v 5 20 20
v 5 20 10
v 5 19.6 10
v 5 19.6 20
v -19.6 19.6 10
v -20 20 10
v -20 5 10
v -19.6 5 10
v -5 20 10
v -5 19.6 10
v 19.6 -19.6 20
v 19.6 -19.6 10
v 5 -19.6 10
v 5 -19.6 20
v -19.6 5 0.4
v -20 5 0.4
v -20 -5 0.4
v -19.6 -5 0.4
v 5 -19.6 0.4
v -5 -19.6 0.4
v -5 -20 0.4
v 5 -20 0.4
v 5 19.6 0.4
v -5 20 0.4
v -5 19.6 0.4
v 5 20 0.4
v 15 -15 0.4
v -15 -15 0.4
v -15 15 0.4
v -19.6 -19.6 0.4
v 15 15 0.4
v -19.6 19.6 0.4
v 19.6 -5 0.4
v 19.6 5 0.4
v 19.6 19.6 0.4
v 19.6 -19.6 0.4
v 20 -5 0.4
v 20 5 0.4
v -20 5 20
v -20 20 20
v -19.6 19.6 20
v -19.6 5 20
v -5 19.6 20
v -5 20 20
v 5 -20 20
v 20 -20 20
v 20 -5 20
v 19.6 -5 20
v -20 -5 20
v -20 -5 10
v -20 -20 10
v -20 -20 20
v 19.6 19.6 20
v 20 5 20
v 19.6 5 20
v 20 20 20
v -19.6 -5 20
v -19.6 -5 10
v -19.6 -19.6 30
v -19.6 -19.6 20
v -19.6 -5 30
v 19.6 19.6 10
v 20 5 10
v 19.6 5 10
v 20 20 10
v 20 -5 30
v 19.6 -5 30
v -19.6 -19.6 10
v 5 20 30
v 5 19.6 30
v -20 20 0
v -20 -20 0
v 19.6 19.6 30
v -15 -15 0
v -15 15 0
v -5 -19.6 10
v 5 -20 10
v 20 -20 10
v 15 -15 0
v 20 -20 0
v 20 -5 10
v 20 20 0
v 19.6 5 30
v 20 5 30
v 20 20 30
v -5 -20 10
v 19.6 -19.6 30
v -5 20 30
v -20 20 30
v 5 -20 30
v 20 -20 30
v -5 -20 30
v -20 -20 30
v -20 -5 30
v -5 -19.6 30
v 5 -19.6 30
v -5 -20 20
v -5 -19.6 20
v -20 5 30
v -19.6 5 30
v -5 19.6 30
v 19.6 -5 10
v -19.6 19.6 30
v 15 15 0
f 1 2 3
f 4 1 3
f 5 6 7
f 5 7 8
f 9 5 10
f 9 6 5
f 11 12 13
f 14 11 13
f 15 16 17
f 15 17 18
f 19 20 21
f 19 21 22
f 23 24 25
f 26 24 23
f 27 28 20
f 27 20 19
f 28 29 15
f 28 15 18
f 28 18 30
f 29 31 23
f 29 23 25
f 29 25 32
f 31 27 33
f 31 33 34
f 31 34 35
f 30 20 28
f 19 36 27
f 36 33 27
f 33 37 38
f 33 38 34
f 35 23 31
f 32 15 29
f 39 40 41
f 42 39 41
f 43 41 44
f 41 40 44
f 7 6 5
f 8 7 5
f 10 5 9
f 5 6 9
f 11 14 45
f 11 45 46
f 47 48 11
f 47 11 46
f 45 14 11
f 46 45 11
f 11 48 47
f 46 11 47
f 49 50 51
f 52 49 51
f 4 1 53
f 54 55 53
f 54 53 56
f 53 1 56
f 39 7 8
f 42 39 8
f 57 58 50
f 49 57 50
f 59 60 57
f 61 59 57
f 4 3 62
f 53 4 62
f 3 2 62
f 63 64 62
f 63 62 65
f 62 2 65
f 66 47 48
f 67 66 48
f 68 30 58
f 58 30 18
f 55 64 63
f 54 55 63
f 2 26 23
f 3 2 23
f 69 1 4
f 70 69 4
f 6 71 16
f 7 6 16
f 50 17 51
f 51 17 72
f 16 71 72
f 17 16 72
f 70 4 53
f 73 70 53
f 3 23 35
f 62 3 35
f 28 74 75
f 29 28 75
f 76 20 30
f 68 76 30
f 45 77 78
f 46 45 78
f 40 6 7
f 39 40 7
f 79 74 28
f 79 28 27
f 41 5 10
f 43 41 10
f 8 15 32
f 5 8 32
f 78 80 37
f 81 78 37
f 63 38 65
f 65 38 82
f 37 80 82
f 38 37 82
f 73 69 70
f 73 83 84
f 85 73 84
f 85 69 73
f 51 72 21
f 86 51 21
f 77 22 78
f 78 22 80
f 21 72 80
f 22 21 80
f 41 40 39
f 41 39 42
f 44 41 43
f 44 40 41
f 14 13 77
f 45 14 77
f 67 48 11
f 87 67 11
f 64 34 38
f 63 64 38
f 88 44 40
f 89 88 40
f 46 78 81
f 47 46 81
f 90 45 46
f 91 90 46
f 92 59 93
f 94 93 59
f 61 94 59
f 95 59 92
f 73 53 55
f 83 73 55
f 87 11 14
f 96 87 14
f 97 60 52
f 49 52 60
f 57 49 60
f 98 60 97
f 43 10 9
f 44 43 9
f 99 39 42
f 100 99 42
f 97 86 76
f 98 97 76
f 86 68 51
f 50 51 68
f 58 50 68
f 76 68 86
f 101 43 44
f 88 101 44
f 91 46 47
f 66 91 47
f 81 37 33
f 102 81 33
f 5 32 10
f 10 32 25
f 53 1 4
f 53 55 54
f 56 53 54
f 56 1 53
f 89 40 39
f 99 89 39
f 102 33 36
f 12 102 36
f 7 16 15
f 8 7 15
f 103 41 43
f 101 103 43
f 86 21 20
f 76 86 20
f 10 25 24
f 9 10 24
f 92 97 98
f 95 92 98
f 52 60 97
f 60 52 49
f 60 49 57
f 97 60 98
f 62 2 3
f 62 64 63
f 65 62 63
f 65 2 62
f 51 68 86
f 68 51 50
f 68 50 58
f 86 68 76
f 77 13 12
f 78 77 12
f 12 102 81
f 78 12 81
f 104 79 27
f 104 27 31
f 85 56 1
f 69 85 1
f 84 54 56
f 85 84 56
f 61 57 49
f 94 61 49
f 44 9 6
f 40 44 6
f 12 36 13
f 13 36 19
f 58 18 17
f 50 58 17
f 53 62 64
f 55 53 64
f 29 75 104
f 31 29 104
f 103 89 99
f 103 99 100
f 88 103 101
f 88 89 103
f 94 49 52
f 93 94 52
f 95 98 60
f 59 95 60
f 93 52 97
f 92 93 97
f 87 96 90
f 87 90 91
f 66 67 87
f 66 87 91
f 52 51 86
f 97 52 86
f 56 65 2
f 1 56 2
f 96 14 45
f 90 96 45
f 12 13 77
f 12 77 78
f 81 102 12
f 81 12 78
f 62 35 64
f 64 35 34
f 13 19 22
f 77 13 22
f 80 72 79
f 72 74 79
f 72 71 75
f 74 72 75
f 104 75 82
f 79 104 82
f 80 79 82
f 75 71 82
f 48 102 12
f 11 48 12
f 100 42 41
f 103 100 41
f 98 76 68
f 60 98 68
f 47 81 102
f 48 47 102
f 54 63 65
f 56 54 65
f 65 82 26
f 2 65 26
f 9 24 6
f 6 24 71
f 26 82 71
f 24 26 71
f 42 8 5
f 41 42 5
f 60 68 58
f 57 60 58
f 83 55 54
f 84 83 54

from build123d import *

# Parameters (mm, degrees)
F1_W     = 30
F1_H     = 30
F2_DEPTH = 0.4
F3_DEPTH = 10
F4_DEPTH = 10
F5_DEPTH = 10


with BuildPart() as f2:
    # F1 (on Top) → F2 (new body)
    with BuildSketch(Plane.XY):
        Polygon((-5, 20), (-20, 20), (-20, 5), (-19.6, 5), (-19.6, 19.6), (-5, 19.6), align=None)
        Polygon((20, 20), (5, 20), (5, 19.6), (19.6, 19.6), (19.6, 5), (20, 5), align=None)
        Polygon((5, 20), (-5, 20), (-5, 19.6), (-19.6, 19.6), (-19.6, 5), (-20, 5), (-20, -5), (-19.6, -5), (-19.6, -19.6), (-5, -19.6), (-5, -20), (5, -20), (5, -19.6), (19.6, -19.6), (19.6, -5), (20, -5), (20, 5), (19.6, 5), (19.6, 19.6), (5, 19.6), align=None)
        Rectangle(F1_W, F1_H, mode=Mode.SUBTRACT)
        Polygon((20, -20), (20, -5), (19.6, -5), (19.6, -19.6), (5, -19.6), (5, -20), align=None)
        Polygon((-19.6, -5), (-20, -5), (-20, -20), (-5, -20), (-5, -19.6), (-19.6, -19.6), align=None)
    extrude(amount=F2_DEPTH)

    # F1 (on Top) → F3 (join)
    with BuildSketch(Plane.XY):
        Polygon((20, -20), (20, -5), (19.6, -5), (19.6, -19.6), (5, -19.6), (5, -20), align=None)
        Polygon((-19.6, -5), (-20, -5), (-20, -20), (-5, -20), (-5, -19.6), (-19.6, -19.6), align=None)
        Polygon((20, 20), (5, 20), (5, 19.6), (19.6, 19.6), (19.6, 5), (20, 5), align=None)
        Polygon((-5, 20), (-20, 20), (-20, 5), (-19.6, 5), (-19.6, 19.6), (-5, 19.6), align=None)
    extrude(amount=F3_DEPTH)


with BuildPart() as f4:
    # F4 (new): a face of the model
    f4_faces = [f2.part.faces().sort_by_distance(p)[0] for p in [
        (-12.5, 19.7878679656, 10),
    ]]
    extrude(f4_faces, amount=F4_DEPTH)


with BuildPart() as f4b:
    # F4#2 (new): a face of the model
    f4_2_faces = [f2.part.faces().sort_by_distance(p)[0] for p in [
        (12.5, 19.7878679656, 10),
    ]]
    extrude(f4_2_faces, amount=F4_DEPTH)


with BuildPart() as f4c:
    # F4#3 (new): a face of the model
    f4_3_faces = [f2.part.faces().sort_by_distance(p)[0] for p in [
        (19.7878679656, -12.5, 10),
    ]]
    extrude(f4_3_faces, amount=F4_DEPTH)


with BuildPart() as f4d:
    # F4#4 (new): a face of the model
    f4_4_faces = [f2.part.faces().sort_by_distance(p)[0] for p in [
        (-19.8, -5.2121320344, 10),
    ]]
    extrude(f4_4_faces, amount=F4_DEPTH)


with BuildPart() as f5:
    # F5 (new): a face of the model
    f5_faces = [f4.part.faces().sort_by_distance(p)[0] for p in [
        (-12.5, 19.7878679656, 20),
    ]]
    extrude(f5_faces, amount=F5_DEPTH)


with BuildPart() as f5b:
    # F5#2 (new): a face of the model
    f5_2_faces = [f4b.part.faces().sort_by_distance(p)[0] for p in [
        (12.5, 19.7878679656, 20),
    ]]
    extrude(f5_2_faces, amount=F5_DEPTH)


with BuildPart() as f5c:
    # F5#3 (new): a face of the model
    f5_3_faces = [f4c.part.faces().sort_by_distance(p)[0] for p in [
        (19.7878679656, -12.5, 20),
    ]]
    extrude(f5_3_faces, amount=F5_DEPTH)


with BuildPart() as f5d:
    # F5#4 (new): a face of the model
    f5_4_faces = [f4d.part.faces().sort_by_distance(p)[0] for p in [
        (-19.8, -5.2121320344, 20),
    ]]
    extrude(f5_4_faces, amount=F5_DEPTH)


solid = Compound([f2.part, f4.part, f4b.part, f4c.part, f4d.part, f5.part, f5b.part, f5c.part, f5d.part])
